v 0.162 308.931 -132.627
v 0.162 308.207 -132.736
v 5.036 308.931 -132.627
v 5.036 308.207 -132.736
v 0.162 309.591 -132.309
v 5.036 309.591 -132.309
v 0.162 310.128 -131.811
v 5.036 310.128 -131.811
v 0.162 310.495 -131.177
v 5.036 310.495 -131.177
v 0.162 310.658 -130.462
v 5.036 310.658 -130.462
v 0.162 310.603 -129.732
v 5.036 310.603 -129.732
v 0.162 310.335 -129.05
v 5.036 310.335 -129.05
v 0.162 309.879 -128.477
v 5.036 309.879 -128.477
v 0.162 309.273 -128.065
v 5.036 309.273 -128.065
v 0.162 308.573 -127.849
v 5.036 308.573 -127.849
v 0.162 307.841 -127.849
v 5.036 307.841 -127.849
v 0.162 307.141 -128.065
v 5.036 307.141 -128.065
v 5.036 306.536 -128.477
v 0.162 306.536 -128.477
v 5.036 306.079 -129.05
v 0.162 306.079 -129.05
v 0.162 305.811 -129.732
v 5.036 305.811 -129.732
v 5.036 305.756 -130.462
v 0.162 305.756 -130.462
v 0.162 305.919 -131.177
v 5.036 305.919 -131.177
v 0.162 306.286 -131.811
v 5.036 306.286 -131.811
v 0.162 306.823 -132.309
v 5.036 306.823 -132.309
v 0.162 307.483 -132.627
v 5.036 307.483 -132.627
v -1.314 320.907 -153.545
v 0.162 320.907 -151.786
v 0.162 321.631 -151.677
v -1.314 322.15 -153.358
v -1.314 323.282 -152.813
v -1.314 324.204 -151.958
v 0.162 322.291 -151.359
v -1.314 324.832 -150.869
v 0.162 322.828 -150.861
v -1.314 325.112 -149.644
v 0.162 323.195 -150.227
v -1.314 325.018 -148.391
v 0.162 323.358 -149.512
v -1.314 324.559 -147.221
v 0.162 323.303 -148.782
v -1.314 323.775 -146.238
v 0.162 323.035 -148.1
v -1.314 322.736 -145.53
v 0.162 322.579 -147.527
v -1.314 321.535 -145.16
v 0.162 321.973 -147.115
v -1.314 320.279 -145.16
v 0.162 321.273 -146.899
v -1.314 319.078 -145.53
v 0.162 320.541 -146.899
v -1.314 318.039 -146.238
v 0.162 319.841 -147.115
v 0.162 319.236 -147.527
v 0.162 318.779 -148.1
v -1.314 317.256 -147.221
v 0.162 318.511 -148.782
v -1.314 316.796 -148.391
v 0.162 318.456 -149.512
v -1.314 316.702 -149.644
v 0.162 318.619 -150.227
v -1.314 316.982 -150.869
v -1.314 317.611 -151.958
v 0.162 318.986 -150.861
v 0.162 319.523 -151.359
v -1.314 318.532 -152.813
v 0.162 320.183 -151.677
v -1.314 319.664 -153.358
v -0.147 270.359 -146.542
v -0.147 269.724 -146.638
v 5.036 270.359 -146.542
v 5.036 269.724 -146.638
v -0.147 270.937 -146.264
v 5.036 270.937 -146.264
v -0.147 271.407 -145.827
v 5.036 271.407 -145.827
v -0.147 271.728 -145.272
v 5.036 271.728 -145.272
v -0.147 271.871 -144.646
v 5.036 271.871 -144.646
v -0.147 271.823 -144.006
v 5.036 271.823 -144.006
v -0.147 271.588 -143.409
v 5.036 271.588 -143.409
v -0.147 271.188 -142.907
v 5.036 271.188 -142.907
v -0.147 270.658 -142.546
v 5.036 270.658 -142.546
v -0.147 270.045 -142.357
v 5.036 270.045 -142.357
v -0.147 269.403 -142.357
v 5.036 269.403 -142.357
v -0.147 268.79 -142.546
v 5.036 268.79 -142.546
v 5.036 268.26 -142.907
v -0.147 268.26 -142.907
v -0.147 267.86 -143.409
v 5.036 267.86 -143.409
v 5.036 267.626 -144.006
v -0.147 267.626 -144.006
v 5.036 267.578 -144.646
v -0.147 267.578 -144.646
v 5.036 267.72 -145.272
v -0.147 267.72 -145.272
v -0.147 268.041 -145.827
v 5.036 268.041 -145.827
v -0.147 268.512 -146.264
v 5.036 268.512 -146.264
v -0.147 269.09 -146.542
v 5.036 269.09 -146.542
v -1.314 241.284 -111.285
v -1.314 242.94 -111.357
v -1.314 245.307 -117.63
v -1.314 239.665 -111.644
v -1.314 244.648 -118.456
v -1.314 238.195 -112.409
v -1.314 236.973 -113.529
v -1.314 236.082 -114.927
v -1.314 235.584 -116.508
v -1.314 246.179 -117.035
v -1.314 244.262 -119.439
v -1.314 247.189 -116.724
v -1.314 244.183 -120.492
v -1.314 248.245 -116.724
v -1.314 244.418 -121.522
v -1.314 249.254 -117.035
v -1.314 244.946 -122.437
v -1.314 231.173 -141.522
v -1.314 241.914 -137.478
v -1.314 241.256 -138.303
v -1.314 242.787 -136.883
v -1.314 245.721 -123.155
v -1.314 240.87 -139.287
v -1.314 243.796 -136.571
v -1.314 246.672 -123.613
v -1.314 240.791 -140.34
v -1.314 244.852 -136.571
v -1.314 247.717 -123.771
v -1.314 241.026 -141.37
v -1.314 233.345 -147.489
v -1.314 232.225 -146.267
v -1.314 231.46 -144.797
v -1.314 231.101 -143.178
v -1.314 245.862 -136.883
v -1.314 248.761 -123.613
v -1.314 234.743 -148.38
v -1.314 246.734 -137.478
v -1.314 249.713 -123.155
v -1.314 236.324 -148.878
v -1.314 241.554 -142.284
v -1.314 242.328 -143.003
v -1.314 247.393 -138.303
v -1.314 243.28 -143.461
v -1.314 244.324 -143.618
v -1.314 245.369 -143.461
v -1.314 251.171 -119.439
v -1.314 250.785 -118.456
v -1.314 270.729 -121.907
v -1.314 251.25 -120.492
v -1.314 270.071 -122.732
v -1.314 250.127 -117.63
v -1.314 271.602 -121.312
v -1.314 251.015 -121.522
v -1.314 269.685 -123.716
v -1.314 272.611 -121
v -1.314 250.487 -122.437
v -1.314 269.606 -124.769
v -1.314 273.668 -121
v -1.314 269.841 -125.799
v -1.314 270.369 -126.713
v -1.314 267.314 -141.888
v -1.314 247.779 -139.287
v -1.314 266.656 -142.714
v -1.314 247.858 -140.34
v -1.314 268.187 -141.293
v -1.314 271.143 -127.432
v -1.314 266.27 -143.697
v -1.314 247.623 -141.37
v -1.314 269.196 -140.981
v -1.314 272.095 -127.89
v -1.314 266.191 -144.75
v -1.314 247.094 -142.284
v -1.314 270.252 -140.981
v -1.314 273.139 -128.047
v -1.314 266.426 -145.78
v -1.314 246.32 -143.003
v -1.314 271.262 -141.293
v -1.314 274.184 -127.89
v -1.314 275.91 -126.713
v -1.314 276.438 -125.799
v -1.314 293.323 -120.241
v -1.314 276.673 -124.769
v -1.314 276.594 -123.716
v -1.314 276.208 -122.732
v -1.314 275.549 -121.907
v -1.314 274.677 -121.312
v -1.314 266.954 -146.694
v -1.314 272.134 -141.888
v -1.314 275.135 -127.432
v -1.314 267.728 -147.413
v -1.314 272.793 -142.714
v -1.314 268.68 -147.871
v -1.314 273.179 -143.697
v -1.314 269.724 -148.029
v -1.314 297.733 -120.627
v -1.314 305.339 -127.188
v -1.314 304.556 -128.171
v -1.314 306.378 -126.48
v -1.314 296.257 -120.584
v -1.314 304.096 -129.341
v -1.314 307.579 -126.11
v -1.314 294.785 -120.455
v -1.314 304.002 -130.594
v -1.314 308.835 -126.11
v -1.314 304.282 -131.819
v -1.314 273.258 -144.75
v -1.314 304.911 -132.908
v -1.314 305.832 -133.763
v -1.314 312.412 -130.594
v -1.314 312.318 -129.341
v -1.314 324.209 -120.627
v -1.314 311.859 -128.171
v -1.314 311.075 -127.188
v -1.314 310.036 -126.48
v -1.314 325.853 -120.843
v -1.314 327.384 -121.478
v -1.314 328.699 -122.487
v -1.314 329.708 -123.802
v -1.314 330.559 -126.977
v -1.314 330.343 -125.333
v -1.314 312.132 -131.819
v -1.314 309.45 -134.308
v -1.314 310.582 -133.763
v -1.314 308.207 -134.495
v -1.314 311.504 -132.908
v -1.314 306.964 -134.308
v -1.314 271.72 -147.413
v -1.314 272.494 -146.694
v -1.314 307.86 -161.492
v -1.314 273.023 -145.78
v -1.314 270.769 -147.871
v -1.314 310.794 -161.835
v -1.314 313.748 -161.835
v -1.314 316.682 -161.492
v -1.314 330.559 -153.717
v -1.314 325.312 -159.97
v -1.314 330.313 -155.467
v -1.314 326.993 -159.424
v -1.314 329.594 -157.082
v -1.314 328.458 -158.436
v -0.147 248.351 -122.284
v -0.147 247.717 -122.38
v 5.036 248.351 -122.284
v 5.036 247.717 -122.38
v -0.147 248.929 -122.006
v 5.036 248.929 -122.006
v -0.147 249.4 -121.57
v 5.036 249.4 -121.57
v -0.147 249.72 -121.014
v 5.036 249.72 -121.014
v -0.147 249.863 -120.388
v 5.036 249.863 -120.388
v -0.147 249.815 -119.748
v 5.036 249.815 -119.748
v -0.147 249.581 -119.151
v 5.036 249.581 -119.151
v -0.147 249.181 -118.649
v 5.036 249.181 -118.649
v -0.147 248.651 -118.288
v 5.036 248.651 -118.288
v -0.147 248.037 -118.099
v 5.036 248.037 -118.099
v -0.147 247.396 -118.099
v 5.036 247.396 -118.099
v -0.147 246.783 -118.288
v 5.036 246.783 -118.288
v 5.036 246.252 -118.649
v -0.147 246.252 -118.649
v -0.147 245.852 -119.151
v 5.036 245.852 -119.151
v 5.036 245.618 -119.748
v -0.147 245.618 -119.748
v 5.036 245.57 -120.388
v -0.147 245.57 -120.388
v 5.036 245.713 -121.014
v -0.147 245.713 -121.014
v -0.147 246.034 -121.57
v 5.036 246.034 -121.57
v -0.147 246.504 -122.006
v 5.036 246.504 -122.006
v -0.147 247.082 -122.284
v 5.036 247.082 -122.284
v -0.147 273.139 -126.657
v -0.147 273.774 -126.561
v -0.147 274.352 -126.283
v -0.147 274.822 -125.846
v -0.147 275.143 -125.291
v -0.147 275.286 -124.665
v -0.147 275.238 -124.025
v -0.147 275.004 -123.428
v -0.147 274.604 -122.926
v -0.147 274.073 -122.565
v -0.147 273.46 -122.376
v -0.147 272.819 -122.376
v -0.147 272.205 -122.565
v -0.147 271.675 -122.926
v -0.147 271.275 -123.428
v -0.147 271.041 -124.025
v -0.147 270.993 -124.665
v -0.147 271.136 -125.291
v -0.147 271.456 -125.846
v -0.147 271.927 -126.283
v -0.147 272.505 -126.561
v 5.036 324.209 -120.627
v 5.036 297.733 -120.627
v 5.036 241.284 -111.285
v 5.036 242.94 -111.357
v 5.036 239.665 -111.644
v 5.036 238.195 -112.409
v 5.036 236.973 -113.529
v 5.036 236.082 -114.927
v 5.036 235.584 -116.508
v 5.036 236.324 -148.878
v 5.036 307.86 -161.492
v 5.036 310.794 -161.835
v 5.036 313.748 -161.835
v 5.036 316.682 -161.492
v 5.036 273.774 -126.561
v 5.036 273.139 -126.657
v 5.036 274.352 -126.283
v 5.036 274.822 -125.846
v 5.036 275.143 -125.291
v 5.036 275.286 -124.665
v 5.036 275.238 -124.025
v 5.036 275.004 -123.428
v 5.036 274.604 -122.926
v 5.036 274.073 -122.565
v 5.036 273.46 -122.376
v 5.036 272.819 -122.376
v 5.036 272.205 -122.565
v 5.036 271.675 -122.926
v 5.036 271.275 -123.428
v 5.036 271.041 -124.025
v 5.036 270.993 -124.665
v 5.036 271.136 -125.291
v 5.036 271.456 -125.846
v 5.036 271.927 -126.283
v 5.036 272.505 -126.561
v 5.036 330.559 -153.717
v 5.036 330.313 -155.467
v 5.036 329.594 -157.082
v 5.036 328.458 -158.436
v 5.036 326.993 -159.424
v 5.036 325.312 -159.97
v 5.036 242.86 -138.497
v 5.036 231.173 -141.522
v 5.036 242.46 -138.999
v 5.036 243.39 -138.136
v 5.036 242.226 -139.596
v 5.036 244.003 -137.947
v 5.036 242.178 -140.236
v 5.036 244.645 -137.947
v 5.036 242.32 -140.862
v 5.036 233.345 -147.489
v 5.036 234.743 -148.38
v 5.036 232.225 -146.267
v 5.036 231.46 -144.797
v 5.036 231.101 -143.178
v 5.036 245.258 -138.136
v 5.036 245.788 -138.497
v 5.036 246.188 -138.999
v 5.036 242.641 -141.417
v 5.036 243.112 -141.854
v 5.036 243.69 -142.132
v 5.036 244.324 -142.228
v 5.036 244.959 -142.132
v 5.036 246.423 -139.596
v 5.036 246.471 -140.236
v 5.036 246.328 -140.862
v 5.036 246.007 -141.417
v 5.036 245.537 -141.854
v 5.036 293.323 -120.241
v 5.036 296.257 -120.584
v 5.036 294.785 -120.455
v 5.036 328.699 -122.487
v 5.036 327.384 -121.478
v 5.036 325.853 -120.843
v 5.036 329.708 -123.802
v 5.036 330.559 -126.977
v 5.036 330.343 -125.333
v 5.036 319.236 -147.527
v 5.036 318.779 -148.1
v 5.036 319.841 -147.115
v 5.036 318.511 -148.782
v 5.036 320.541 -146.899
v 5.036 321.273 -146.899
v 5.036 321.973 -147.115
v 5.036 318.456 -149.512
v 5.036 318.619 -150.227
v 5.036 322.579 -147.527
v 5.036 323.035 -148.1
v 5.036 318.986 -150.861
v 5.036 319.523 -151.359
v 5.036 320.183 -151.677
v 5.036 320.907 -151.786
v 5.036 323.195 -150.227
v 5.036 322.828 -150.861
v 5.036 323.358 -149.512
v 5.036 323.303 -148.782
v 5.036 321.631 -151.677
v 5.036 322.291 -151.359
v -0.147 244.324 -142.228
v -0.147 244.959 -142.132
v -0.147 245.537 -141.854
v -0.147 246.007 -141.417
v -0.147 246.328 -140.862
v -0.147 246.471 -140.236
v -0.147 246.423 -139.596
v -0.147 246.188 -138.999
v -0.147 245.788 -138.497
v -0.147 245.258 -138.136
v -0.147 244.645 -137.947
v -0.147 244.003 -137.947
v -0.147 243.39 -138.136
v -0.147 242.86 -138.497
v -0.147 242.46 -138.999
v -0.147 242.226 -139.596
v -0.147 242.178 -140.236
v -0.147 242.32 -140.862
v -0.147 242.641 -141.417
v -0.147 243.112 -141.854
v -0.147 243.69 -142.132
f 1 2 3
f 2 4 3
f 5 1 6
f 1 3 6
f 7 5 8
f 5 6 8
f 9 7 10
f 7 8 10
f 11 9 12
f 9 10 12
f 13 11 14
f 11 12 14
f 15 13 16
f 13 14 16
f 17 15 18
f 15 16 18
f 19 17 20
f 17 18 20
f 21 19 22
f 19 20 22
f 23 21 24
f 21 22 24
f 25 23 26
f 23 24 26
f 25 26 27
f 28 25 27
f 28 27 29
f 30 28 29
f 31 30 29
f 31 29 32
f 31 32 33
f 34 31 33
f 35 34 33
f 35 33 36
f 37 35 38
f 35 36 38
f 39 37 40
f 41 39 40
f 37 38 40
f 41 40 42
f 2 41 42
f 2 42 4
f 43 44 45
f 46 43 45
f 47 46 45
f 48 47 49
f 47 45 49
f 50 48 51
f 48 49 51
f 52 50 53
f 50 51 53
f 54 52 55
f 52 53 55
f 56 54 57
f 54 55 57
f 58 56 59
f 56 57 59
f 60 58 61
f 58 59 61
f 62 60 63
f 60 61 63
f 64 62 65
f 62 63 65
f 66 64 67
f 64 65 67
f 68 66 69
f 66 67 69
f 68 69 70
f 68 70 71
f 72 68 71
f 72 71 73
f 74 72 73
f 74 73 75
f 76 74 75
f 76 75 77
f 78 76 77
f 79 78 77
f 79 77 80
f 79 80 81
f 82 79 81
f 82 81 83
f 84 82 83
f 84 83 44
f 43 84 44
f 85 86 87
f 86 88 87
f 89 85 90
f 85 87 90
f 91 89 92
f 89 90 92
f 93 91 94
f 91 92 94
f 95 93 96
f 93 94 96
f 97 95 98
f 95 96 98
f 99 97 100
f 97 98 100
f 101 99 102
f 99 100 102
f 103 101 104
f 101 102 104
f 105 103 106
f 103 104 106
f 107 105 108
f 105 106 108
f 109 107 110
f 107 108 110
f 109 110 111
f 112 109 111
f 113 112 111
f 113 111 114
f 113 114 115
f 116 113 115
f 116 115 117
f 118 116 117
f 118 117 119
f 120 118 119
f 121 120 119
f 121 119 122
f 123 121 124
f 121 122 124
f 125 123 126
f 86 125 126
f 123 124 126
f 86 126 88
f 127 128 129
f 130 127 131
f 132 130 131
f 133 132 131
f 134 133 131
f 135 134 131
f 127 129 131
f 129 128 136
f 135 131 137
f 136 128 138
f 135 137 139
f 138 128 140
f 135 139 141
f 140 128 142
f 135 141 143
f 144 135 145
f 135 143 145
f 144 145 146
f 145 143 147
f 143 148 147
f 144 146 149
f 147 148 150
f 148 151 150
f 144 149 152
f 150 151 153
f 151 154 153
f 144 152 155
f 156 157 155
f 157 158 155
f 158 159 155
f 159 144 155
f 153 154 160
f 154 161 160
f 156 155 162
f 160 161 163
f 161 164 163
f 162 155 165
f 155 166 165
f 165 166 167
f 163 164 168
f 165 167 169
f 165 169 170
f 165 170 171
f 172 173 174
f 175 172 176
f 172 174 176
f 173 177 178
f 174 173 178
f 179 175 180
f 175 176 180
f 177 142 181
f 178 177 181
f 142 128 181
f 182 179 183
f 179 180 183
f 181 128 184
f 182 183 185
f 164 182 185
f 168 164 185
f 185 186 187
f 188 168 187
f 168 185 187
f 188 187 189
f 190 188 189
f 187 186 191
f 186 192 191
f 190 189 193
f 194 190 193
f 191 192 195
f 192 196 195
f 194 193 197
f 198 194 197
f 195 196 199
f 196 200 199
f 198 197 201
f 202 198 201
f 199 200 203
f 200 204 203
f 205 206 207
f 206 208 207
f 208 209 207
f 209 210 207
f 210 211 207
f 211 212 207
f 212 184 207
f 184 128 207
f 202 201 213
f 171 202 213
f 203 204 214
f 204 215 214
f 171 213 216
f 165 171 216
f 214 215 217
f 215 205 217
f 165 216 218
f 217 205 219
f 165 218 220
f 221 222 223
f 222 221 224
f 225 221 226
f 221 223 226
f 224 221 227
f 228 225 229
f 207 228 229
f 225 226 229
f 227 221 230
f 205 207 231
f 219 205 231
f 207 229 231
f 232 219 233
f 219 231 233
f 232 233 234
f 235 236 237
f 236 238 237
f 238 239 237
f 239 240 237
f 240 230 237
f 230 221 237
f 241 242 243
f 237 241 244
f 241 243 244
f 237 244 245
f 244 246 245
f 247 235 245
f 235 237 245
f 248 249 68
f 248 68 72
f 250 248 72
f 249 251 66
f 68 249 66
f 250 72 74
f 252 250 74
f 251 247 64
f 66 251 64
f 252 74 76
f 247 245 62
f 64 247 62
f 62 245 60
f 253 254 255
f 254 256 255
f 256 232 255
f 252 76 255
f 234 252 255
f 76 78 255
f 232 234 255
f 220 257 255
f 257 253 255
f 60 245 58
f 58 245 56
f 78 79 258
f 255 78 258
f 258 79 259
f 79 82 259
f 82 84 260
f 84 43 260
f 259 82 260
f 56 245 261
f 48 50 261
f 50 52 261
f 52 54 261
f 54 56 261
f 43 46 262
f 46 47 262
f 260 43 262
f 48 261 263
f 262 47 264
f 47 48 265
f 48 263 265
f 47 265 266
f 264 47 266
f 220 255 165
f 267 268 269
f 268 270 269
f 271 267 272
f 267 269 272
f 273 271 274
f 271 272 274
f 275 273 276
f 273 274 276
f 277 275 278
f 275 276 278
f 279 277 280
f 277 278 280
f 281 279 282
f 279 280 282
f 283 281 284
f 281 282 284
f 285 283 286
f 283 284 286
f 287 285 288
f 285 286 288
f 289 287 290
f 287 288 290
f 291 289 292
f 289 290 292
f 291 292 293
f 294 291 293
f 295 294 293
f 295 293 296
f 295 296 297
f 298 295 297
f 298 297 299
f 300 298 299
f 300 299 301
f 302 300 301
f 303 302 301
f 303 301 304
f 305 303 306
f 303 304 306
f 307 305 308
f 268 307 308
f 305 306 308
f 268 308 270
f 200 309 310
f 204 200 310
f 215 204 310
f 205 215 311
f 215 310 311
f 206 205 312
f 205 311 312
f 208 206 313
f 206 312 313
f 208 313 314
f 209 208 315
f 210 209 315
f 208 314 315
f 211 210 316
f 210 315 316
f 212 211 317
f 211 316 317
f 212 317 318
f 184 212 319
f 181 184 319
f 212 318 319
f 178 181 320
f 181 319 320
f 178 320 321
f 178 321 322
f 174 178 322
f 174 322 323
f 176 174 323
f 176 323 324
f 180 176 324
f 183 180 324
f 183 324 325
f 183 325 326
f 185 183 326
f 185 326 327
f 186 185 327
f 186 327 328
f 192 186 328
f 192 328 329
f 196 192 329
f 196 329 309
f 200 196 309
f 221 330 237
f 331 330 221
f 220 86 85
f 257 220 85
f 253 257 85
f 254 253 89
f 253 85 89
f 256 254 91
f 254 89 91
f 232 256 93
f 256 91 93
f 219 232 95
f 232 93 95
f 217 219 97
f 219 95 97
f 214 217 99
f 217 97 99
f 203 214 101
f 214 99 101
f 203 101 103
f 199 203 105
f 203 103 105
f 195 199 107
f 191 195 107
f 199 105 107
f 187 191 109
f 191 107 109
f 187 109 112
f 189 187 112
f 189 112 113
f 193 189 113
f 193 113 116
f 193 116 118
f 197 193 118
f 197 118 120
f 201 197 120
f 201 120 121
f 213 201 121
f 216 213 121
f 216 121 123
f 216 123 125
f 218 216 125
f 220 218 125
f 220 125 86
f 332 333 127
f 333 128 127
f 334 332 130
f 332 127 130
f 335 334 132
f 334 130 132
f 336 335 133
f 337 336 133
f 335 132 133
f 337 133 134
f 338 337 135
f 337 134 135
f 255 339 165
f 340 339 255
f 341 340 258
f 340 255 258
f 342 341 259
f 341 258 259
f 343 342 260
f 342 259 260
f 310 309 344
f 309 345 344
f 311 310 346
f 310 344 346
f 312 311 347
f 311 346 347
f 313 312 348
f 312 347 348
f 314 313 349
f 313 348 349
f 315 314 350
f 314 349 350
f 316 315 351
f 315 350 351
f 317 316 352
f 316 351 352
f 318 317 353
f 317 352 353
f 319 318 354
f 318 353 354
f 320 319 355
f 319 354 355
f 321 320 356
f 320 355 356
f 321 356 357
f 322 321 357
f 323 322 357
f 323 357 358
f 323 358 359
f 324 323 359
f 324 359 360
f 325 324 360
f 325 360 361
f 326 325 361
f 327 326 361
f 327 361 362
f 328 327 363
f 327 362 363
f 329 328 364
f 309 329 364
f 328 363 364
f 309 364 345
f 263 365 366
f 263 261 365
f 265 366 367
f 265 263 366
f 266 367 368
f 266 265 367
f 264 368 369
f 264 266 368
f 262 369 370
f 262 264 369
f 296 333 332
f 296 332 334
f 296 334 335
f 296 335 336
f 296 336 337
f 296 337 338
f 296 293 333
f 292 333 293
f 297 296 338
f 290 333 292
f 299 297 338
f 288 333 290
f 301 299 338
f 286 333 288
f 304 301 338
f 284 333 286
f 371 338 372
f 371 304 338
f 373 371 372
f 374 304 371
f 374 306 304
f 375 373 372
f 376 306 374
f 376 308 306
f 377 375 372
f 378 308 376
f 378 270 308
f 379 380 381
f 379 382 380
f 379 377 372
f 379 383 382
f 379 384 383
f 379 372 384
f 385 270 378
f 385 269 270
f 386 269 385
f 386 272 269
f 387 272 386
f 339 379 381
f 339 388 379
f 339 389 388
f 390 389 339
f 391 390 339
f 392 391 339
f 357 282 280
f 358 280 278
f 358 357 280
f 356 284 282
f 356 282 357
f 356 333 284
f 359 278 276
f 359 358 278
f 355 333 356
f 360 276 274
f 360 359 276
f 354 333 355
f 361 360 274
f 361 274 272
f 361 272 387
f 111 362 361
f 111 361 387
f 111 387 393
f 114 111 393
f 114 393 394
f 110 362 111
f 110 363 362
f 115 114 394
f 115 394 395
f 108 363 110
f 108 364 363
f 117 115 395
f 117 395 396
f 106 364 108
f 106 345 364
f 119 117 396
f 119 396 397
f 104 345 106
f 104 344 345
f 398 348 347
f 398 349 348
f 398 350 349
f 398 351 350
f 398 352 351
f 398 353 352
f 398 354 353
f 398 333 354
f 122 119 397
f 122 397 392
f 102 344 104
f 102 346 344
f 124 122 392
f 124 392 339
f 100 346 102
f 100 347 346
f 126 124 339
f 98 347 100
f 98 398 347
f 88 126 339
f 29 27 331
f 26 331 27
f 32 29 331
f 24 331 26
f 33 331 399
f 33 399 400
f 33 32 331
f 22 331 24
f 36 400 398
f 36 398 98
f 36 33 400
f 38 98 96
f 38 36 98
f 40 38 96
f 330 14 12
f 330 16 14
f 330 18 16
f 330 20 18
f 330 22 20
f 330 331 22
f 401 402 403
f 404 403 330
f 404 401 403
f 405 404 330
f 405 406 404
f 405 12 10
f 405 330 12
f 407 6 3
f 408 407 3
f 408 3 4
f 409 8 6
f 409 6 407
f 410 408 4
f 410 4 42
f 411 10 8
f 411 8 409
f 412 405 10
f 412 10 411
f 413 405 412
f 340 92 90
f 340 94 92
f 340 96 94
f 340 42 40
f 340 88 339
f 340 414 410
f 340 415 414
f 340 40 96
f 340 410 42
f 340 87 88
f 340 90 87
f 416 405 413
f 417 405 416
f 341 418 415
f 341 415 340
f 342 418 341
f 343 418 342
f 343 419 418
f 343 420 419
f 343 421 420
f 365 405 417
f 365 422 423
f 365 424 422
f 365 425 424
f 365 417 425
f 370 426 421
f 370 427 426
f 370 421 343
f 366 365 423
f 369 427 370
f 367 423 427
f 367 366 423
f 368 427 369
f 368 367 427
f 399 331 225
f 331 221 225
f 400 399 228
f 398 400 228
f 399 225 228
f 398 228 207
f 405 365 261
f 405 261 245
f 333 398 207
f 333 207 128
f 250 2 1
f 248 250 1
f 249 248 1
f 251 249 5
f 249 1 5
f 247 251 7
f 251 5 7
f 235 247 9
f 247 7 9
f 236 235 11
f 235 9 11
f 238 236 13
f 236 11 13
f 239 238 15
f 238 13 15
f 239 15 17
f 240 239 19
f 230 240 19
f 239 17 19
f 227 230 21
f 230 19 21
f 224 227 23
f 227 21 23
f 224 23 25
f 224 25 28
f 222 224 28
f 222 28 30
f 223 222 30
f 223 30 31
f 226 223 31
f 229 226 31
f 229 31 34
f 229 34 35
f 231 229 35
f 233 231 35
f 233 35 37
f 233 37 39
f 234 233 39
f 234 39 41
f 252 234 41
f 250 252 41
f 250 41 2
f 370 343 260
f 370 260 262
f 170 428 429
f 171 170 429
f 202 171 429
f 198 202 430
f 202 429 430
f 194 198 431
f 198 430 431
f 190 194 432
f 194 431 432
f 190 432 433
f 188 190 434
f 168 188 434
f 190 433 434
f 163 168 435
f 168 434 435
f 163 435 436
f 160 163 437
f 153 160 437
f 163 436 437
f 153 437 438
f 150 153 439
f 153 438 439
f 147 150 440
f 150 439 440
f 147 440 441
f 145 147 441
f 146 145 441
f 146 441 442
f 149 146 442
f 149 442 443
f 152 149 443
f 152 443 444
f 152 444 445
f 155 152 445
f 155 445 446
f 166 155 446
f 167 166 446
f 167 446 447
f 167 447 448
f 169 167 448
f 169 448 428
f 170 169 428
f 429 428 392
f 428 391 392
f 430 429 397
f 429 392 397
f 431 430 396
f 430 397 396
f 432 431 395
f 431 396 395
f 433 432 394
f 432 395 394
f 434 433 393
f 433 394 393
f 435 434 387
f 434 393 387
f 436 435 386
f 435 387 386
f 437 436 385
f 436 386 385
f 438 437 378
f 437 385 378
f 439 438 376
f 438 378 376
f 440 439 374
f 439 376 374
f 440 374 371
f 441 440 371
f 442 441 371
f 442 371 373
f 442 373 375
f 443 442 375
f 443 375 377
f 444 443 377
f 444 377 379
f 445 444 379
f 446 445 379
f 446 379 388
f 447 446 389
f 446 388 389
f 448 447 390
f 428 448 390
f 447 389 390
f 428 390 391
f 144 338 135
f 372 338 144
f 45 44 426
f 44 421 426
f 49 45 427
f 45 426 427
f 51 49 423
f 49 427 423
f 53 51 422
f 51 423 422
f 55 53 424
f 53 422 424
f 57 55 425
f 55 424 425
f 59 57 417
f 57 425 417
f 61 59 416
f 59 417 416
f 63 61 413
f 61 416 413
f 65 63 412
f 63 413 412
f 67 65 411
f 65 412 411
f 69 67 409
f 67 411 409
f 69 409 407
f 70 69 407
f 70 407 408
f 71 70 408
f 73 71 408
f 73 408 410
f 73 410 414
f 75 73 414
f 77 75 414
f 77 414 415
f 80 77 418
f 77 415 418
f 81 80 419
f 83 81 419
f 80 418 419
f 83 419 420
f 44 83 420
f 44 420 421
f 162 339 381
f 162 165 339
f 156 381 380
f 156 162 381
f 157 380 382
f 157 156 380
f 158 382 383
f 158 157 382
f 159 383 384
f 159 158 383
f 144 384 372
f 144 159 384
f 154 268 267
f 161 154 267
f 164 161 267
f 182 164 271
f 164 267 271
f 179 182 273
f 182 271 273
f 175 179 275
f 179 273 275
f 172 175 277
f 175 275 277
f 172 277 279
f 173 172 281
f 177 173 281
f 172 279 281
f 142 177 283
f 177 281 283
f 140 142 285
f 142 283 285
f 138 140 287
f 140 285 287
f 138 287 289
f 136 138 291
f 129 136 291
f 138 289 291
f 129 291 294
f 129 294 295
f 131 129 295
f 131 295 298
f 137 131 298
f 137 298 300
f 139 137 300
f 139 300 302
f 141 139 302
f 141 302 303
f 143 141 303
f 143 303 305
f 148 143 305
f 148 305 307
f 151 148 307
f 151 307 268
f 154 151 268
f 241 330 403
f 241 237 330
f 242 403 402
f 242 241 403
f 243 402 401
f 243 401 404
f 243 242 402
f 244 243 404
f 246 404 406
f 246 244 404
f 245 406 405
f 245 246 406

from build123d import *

# Parameters (mm, degrees)
BOSS_EXTRUDE1_DEPTH                               = 6.35
FILLET1_R                                         = 25.4
CSK_FOR_6_FLAT_HEAD_MACHINE_SCREW_100_D           = 4.3053
CSK_FOR_6_FLAT_HEAD_MACHINE_SCREW_100_CSINK_D     = 7.0866
CSK_FOR_6_FLAT_HEAD_MACHINE_SCREW_100_CSINK_ANGLE = 100
CSK_FOR_8_FLAT_HEAD_MACHINE_SCREW_100_D           = 4.9149
CSK_FOR_8_FLAT_HEAD_MACHINE_SCREW_100_CSINK_D     = 8.4328
CSK_FOR_8_FLAT_HEAD_MACHINE_SCREW_100_CSINK_ANGLE = 100
FILLET2_R                                         = 6.35


with BuildPart() as part:
    # Sketch1 → Boss-Extrude1 (new body)
    with BuildSketch(Plane.ZY.offset(-5.035827965)):
        Polygon((-147.77562455, 230.070458845), (-162.269800873, 312.271017517), (-159.04513305, 330.559017517), (-120.626834873, 330.559017517), (-120.626834873, 295.511176933), (-110.25444916, 236.686454414), align=None)
    extrude(amount=BOSS_EXTRUDE1_DEPTH)

    # Fillet1
    fillet1_edges = [part.edges().sort_by_distance(p)[0] for p in [
        (1.860827965, 312.271017517, -162.269800873),
        (1.860827965, 295.511176933, -120.626834873),
    ]]
    fillet(fillet1_edges, radius=FILLET1_R)

    # CSK for #6 Flat Head Machine Screw (100)1 (through all)
    with Locations(Plane.ZY.offset(1.314172035)):
        with Locations((-124.504125043, 273.139415456), (-144.485224025, 269.724179148), (-140.075144867, 244.324179148), (-120.227402214, 247.716621746)):
            CounterSinkHole(CSK_FOR_6_FLAT_HEAD_MACHINE_SCREW_100_D / 2, CSK_FOR_6_FLAT_HEAD_MACHINE_SCREW_100_CSINK_D / 2, counter_sink_angle=CSK_FOR_6_FLAT_HEAD_MACHINE_SCREW_100_CSINK_ANGLE)

    # CSK for #8 Flat Head Machine Screw (100)1 (through all)
    with Locations(Plane.ZY.offset(1.314172035)):
        with Locations((-149.328834873, 320.907017517), (-130.278834873, 308.207017517)):
            CounterSinkHole(CSK_FOR_8_FLAT_HEAD_MACHINE_SCREW_100_D / 2, CSK_FOR_8_FLAT_HEAD_MACHINE_SCREW_100_CSINK_D / 2, counter_sink_angle=CSK_FOR_8_FLAT_HEAD_MACHINE_SCREW_100_CSINK_ANGLE)

    # Fillet2
    fillet2_edges = [part.edges().sort_by_distance(p)[0] for p in [
        (1.860827965, 230.070458845, -147.77562455),
        (1.860827965, 330.559017517, -159.04513305),
        (1.860827965, 330.559017517, -120.626834873),
        (1.860827965, 236.686454414, -110.25444916),
    ]]
    fillet(fillet2_edges, radius=FILLET2_R)


solid = part.part
